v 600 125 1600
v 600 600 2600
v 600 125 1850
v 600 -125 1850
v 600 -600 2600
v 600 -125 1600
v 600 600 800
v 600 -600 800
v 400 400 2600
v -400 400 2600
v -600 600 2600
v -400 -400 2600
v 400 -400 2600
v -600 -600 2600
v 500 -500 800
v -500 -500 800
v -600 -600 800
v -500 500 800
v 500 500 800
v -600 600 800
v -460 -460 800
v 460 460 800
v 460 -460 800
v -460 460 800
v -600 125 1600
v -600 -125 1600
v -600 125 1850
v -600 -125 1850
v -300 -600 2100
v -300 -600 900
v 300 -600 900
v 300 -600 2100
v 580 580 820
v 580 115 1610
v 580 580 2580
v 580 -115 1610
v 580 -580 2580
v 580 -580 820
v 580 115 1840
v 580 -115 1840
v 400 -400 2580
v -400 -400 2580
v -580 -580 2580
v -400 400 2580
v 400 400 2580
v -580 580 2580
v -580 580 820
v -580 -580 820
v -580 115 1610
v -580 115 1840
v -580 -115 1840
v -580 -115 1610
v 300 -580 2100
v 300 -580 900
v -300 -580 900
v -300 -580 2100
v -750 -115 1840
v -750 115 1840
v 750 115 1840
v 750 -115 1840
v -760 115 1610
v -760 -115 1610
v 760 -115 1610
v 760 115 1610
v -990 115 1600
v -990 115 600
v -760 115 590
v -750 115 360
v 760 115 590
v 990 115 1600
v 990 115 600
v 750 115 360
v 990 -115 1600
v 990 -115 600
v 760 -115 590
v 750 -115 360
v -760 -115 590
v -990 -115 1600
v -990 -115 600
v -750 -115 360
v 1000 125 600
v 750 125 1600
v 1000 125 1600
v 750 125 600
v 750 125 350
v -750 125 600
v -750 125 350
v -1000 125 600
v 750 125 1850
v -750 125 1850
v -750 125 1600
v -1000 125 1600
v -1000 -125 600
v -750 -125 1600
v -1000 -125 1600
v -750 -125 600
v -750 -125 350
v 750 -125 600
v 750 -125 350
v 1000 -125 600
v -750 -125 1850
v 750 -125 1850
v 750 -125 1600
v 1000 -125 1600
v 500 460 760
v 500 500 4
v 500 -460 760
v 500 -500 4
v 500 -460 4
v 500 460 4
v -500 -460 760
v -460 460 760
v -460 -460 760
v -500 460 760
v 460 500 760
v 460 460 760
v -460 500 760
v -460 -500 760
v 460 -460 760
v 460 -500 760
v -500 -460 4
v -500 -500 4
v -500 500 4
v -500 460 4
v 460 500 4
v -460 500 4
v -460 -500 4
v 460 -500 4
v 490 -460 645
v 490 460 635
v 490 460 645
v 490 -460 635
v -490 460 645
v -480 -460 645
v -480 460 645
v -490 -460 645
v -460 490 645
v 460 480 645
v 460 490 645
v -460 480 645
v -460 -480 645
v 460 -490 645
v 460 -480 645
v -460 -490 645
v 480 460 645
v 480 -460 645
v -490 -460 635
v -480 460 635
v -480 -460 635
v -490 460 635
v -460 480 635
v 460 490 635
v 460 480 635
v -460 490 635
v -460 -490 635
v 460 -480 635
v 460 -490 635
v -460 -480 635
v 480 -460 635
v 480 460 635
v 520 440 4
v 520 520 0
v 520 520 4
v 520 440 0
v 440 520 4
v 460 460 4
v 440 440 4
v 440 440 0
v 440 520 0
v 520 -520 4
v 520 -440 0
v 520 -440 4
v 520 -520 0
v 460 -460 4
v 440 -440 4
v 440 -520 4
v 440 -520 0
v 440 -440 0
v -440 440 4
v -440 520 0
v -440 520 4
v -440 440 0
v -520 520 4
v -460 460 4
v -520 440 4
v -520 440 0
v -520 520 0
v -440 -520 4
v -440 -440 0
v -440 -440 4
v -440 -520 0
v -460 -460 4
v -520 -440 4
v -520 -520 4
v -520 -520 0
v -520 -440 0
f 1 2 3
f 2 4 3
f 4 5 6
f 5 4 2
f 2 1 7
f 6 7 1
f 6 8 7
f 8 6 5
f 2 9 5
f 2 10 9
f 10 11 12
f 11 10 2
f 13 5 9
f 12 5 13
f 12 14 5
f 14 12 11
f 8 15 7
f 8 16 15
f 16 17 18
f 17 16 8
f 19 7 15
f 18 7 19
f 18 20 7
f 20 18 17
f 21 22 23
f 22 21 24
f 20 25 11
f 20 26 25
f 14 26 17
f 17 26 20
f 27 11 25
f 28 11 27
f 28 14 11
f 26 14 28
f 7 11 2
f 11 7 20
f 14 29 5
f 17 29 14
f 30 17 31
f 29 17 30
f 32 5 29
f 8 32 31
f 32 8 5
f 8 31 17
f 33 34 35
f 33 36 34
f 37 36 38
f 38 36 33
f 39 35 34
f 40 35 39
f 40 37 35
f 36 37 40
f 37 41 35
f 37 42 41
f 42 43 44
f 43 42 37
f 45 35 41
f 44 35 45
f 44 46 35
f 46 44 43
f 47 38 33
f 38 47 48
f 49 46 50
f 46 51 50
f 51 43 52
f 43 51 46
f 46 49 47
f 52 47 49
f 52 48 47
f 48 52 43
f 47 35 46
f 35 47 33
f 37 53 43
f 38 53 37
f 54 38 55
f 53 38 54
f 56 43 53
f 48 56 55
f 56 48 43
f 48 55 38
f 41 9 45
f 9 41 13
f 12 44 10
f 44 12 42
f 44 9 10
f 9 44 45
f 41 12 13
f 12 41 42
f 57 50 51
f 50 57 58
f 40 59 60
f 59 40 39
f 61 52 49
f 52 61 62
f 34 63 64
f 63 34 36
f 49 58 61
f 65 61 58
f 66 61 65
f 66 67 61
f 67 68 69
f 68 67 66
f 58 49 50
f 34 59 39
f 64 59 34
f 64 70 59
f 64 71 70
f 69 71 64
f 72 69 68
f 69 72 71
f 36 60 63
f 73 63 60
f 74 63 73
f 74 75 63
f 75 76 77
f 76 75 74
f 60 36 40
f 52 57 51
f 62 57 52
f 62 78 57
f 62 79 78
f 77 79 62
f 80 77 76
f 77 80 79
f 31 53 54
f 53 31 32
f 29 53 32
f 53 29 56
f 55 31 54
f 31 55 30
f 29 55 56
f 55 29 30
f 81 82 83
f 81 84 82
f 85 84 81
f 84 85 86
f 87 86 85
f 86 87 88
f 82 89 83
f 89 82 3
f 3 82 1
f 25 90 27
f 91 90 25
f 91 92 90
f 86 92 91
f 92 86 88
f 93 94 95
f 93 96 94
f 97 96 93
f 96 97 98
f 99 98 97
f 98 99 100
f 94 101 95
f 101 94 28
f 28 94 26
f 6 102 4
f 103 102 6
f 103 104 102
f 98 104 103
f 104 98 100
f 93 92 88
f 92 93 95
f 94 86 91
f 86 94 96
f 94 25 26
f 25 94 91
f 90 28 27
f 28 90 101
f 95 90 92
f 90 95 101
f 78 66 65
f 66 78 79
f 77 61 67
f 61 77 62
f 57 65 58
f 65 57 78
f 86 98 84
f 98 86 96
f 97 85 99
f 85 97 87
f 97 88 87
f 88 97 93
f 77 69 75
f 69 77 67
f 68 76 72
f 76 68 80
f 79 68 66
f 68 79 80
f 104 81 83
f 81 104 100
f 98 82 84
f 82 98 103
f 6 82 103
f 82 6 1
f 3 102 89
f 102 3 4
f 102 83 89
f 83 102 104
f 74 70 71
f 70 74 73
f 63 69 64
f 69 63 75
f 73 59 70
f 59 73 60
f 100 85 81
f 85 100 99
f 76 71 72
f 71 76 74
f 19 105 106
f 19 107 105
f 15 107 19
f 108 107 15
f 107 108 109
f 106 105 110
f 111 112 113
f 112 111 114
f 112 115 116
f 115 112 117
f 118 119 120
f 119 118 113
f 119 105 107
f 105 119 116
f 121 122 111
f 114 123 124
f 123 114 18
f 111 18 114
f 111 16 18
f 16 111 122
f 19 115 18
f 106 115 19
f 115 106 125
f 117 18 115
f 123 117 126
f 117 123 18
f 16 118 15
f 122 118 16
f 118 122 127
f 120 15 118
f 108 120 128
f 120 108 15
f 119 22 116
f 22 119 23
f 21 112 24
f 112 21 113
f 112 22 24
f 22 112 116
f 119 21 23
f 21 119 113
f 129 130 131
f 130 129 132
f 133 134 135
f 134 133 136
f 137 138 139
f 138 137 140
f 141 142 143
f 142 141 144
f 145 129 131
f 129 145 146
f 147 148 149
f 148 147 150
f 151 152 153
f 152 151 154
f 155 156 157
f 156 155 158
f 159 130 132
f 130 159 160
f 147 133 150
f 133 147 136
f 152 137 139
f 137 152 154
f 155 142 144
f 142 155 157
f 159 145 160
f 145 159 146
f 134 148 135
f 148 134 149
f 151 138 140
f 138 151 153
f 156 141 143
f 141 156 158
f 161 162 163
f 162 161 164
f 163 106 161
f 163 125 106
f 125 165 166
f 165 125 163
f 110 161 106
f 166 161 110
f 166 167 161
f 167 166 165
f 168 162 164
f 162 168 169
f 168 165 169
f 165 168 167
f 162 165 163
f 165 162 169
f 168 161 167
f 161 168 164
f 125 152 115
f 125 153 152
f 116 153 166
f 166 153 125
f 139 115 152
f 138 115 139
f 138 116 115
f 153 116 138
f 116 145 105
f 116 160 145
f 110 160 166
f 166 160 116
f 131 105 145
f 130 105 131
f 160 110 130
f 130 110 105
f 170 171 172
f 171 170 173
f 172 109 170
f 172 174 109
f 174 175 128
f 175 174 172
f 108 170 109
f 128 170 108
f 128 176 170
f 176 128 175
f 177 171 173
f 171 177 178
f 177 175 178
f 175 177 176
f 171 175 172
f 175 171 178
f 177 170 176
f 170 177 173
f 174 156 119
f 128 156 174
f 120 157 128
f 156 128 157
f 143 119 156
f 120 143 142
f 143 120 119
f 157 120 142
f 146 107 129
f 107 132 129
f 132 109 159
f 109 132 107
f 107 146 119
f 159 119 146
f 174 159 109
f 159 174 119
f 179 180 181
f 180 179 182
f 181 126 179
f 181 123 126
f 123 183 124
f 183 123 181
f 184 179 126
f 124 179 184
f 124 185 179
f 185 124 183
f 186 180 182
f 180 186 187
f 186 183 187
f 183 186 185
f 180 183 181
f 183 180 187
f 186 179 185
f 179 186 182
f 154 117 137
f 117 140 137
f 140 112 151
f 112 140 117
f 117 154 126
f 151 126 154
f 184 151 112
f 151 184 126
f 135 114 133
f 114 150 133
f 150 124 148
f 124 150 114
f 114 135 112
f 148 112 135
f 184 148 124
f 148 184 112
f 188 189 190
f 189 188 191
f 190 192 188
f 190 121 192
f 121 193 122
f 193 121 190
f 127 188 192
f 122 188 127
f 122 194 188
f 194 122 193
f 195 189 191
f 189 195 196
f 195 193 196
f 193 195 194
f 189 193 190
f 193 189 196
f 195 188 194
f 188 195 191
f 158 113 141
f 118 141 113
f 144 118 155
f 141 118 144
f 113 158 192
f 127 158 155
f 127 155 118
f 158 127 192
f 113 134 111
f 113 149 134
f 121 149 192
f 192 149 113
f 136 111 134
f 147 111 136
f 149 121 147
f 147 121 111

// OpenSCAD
// file: ../shared/half_periscope.scad
diameter=10;
horizontal_leg=3;
vertical_leg=7;
wall_thickness=0.5;

module half_periscope(
    d=diameter,
    h=horizontal_leg,
    v=vertical_leg,
    w=wall_thickness
) {
  translate([-d/2,-(h+d/2),-d-v])
    rotate([90,0,90])
        difference(){
            linear_extrude(d)
                polygon([[0,0], [h,0], [d+h,d], [d+h,d+v],[h,d+v],[h,d],[0,d]]);
            translate([0,0,w])
                linear_extrude(d-w-w)
                    polygon([[-w,w], [h,w], [d+h-w,d], [d+h-w,d+v+w],[h+w,d+v+w],[h+w,d-w],[-w,d-w]]);
    }  
}

half_periscope();
// file: ../shared/periscope.scad
diameter=20;
top_hl=5;
bottom_hl=2;
height=60;
wall_thickness=1;
twist=180;

use <half_periscope.scad>

module periscope(
    d=diameter,
    th=top_hl,
    bh=bottom_hl,
    h=height,
    w=wall_thickness,
    t=twist
) {
    translate([0,0,h/2])
    union() {
        half_periscope(d,bh,(h/2)-d,w);
        translate([0,0,-w])
            rotate([0,180,t])
                half_periscope(d,th,((h/2)-d)+w,w);
    }
}

periscope();
// file: ../shared/stand.scad
stand_width=100;
stand_height=80;
stand_leg_diameter=4;

module stand(
    sw=stand_width,
    sh=stand_height,
    sld=stand_leg_diameter
){
    module leg(x,y) {
        union() {
        translate([x,y,sld/20])
            cube([2*sld,2*sld,sld/10],true);
        translate([x,y,sh/2])
            cube([sld,sld,sh],true);
        }
    }
  
    module square(e,d,offset) {
            translate([0,0,e])
                difference() {
                    cube([sw-offset,sw-offset,d], true);
                    cube([sw-2*d-offset,sw-2*d-offset,2*d], true);
                }
    }
    union() {
        square(sh-sld/2,sld,0);
        square(0.8*sh,sld/4,sld/2);
        leg((sw-sld)/2,(sw-sld)/2);
        leg((sw-sld)/2,(sw-sld)/-2);
        leg((sw-sld)/-2,(sw-sld)/2);
        leg((sw-sld)/-2,(sw-sld)/-2);
    }
}

stand();
// file: ../shared/double_periscope.scad
width=200;
height=120;
gap=100;
diameter=20;
wall_thickness=1;

use <periscope.scad>

module double_periscope(
    w=width,
    h=height,
    g=gap,
    d=diameter,
    t=wall_thickness
){
    module half(r) {
        rotate([0,0,r])
        translate([0,(w-d)/2,0])
            periscope(d,w/2-d+t,(w-g)/2-d,h,t,0);
    }
    
    union() {
        half(90);
        half(270); 
    }
}

double_periscope();
// file: ../shared/box.scad
width =100;
depth =50;
height=200;
wall_thickness=1;

module box(w=width,d=depth,h=height,t=wall_thickness) {
    translate([0,0,h/2])
        difference() {
            cube([w,d,h],true);
            cube([w-2*t,d-2*t,h-2*t],true);
        }
}

box();
// main file
cabin_width=1200;
cabin_height=1800;
cabin_wall_thickness=20;
cabin_skylight_width=800;
periscope_elevation=800;
pipe_width=2000;
pipe_height=1500;
pipe_diameter=250;
pipe_wall_thickness=10;
door_width=600;
door_height=1000;
door_elevation=100;
stand_width=1000;
stand_height=800;
stand_leg_diameter=40;

use <../shared/box.scad>
use<../shared/double_periscope.scad>
use<../shared/stand.scad>

// initial camera distance, rotation and translation
$vpd=10000;
$vpr=[75,0,315];
$vpt=[0,0,1000];

module achterom(
    cw=cabin_width,
    ch=cabin_height,
    cwt=cabin_wall_thickness,
    csw=cabin_skylight_width,
    pe=periscope_elevation,
    pw=pipe_width,
    ph=pipe_height,
    pd=pipe_diameter,
    pwt=pipe_wall_thickness,
    dw=door_width,
    dh=door_height,
    de=door_elevation,
    sw=stand_width,
    sh=stand_height,
    sld=stand_leg_diameter,
){
    module skylight_punch() {
        translate([csw/-2,csw/-2, ch/2])
            cube([csw,csw,ch]);
    }
    
    module periscope_punch() {
        translate([-cw,(pd-2*pwt)/-2,pe+pwt])
            cube([2*cw,pd-2*pwt,pd-2*pwt]);
    }
    
    module door_punch() {
        translate([-dw/2,-cw,de])
        cube([dw,dh,cw]);
    }
    
    module cabin() {
        difference(){
            box(cw,cw,ch,cwt);
            skylight_punch();
            periscope_punch();
            door_punch();
        }
    }
    
    module pipe() {
        translate([0,0,pe+pd])
            rotate([180,0,0])
                double_periscope(pw,ph,cw-cwt,pd,pwt);
    }
    translate([0,0,sh])
        union() {
            cabin();
            pipe();
        }
    stand(sw,sh,sld);
}

achterom();
